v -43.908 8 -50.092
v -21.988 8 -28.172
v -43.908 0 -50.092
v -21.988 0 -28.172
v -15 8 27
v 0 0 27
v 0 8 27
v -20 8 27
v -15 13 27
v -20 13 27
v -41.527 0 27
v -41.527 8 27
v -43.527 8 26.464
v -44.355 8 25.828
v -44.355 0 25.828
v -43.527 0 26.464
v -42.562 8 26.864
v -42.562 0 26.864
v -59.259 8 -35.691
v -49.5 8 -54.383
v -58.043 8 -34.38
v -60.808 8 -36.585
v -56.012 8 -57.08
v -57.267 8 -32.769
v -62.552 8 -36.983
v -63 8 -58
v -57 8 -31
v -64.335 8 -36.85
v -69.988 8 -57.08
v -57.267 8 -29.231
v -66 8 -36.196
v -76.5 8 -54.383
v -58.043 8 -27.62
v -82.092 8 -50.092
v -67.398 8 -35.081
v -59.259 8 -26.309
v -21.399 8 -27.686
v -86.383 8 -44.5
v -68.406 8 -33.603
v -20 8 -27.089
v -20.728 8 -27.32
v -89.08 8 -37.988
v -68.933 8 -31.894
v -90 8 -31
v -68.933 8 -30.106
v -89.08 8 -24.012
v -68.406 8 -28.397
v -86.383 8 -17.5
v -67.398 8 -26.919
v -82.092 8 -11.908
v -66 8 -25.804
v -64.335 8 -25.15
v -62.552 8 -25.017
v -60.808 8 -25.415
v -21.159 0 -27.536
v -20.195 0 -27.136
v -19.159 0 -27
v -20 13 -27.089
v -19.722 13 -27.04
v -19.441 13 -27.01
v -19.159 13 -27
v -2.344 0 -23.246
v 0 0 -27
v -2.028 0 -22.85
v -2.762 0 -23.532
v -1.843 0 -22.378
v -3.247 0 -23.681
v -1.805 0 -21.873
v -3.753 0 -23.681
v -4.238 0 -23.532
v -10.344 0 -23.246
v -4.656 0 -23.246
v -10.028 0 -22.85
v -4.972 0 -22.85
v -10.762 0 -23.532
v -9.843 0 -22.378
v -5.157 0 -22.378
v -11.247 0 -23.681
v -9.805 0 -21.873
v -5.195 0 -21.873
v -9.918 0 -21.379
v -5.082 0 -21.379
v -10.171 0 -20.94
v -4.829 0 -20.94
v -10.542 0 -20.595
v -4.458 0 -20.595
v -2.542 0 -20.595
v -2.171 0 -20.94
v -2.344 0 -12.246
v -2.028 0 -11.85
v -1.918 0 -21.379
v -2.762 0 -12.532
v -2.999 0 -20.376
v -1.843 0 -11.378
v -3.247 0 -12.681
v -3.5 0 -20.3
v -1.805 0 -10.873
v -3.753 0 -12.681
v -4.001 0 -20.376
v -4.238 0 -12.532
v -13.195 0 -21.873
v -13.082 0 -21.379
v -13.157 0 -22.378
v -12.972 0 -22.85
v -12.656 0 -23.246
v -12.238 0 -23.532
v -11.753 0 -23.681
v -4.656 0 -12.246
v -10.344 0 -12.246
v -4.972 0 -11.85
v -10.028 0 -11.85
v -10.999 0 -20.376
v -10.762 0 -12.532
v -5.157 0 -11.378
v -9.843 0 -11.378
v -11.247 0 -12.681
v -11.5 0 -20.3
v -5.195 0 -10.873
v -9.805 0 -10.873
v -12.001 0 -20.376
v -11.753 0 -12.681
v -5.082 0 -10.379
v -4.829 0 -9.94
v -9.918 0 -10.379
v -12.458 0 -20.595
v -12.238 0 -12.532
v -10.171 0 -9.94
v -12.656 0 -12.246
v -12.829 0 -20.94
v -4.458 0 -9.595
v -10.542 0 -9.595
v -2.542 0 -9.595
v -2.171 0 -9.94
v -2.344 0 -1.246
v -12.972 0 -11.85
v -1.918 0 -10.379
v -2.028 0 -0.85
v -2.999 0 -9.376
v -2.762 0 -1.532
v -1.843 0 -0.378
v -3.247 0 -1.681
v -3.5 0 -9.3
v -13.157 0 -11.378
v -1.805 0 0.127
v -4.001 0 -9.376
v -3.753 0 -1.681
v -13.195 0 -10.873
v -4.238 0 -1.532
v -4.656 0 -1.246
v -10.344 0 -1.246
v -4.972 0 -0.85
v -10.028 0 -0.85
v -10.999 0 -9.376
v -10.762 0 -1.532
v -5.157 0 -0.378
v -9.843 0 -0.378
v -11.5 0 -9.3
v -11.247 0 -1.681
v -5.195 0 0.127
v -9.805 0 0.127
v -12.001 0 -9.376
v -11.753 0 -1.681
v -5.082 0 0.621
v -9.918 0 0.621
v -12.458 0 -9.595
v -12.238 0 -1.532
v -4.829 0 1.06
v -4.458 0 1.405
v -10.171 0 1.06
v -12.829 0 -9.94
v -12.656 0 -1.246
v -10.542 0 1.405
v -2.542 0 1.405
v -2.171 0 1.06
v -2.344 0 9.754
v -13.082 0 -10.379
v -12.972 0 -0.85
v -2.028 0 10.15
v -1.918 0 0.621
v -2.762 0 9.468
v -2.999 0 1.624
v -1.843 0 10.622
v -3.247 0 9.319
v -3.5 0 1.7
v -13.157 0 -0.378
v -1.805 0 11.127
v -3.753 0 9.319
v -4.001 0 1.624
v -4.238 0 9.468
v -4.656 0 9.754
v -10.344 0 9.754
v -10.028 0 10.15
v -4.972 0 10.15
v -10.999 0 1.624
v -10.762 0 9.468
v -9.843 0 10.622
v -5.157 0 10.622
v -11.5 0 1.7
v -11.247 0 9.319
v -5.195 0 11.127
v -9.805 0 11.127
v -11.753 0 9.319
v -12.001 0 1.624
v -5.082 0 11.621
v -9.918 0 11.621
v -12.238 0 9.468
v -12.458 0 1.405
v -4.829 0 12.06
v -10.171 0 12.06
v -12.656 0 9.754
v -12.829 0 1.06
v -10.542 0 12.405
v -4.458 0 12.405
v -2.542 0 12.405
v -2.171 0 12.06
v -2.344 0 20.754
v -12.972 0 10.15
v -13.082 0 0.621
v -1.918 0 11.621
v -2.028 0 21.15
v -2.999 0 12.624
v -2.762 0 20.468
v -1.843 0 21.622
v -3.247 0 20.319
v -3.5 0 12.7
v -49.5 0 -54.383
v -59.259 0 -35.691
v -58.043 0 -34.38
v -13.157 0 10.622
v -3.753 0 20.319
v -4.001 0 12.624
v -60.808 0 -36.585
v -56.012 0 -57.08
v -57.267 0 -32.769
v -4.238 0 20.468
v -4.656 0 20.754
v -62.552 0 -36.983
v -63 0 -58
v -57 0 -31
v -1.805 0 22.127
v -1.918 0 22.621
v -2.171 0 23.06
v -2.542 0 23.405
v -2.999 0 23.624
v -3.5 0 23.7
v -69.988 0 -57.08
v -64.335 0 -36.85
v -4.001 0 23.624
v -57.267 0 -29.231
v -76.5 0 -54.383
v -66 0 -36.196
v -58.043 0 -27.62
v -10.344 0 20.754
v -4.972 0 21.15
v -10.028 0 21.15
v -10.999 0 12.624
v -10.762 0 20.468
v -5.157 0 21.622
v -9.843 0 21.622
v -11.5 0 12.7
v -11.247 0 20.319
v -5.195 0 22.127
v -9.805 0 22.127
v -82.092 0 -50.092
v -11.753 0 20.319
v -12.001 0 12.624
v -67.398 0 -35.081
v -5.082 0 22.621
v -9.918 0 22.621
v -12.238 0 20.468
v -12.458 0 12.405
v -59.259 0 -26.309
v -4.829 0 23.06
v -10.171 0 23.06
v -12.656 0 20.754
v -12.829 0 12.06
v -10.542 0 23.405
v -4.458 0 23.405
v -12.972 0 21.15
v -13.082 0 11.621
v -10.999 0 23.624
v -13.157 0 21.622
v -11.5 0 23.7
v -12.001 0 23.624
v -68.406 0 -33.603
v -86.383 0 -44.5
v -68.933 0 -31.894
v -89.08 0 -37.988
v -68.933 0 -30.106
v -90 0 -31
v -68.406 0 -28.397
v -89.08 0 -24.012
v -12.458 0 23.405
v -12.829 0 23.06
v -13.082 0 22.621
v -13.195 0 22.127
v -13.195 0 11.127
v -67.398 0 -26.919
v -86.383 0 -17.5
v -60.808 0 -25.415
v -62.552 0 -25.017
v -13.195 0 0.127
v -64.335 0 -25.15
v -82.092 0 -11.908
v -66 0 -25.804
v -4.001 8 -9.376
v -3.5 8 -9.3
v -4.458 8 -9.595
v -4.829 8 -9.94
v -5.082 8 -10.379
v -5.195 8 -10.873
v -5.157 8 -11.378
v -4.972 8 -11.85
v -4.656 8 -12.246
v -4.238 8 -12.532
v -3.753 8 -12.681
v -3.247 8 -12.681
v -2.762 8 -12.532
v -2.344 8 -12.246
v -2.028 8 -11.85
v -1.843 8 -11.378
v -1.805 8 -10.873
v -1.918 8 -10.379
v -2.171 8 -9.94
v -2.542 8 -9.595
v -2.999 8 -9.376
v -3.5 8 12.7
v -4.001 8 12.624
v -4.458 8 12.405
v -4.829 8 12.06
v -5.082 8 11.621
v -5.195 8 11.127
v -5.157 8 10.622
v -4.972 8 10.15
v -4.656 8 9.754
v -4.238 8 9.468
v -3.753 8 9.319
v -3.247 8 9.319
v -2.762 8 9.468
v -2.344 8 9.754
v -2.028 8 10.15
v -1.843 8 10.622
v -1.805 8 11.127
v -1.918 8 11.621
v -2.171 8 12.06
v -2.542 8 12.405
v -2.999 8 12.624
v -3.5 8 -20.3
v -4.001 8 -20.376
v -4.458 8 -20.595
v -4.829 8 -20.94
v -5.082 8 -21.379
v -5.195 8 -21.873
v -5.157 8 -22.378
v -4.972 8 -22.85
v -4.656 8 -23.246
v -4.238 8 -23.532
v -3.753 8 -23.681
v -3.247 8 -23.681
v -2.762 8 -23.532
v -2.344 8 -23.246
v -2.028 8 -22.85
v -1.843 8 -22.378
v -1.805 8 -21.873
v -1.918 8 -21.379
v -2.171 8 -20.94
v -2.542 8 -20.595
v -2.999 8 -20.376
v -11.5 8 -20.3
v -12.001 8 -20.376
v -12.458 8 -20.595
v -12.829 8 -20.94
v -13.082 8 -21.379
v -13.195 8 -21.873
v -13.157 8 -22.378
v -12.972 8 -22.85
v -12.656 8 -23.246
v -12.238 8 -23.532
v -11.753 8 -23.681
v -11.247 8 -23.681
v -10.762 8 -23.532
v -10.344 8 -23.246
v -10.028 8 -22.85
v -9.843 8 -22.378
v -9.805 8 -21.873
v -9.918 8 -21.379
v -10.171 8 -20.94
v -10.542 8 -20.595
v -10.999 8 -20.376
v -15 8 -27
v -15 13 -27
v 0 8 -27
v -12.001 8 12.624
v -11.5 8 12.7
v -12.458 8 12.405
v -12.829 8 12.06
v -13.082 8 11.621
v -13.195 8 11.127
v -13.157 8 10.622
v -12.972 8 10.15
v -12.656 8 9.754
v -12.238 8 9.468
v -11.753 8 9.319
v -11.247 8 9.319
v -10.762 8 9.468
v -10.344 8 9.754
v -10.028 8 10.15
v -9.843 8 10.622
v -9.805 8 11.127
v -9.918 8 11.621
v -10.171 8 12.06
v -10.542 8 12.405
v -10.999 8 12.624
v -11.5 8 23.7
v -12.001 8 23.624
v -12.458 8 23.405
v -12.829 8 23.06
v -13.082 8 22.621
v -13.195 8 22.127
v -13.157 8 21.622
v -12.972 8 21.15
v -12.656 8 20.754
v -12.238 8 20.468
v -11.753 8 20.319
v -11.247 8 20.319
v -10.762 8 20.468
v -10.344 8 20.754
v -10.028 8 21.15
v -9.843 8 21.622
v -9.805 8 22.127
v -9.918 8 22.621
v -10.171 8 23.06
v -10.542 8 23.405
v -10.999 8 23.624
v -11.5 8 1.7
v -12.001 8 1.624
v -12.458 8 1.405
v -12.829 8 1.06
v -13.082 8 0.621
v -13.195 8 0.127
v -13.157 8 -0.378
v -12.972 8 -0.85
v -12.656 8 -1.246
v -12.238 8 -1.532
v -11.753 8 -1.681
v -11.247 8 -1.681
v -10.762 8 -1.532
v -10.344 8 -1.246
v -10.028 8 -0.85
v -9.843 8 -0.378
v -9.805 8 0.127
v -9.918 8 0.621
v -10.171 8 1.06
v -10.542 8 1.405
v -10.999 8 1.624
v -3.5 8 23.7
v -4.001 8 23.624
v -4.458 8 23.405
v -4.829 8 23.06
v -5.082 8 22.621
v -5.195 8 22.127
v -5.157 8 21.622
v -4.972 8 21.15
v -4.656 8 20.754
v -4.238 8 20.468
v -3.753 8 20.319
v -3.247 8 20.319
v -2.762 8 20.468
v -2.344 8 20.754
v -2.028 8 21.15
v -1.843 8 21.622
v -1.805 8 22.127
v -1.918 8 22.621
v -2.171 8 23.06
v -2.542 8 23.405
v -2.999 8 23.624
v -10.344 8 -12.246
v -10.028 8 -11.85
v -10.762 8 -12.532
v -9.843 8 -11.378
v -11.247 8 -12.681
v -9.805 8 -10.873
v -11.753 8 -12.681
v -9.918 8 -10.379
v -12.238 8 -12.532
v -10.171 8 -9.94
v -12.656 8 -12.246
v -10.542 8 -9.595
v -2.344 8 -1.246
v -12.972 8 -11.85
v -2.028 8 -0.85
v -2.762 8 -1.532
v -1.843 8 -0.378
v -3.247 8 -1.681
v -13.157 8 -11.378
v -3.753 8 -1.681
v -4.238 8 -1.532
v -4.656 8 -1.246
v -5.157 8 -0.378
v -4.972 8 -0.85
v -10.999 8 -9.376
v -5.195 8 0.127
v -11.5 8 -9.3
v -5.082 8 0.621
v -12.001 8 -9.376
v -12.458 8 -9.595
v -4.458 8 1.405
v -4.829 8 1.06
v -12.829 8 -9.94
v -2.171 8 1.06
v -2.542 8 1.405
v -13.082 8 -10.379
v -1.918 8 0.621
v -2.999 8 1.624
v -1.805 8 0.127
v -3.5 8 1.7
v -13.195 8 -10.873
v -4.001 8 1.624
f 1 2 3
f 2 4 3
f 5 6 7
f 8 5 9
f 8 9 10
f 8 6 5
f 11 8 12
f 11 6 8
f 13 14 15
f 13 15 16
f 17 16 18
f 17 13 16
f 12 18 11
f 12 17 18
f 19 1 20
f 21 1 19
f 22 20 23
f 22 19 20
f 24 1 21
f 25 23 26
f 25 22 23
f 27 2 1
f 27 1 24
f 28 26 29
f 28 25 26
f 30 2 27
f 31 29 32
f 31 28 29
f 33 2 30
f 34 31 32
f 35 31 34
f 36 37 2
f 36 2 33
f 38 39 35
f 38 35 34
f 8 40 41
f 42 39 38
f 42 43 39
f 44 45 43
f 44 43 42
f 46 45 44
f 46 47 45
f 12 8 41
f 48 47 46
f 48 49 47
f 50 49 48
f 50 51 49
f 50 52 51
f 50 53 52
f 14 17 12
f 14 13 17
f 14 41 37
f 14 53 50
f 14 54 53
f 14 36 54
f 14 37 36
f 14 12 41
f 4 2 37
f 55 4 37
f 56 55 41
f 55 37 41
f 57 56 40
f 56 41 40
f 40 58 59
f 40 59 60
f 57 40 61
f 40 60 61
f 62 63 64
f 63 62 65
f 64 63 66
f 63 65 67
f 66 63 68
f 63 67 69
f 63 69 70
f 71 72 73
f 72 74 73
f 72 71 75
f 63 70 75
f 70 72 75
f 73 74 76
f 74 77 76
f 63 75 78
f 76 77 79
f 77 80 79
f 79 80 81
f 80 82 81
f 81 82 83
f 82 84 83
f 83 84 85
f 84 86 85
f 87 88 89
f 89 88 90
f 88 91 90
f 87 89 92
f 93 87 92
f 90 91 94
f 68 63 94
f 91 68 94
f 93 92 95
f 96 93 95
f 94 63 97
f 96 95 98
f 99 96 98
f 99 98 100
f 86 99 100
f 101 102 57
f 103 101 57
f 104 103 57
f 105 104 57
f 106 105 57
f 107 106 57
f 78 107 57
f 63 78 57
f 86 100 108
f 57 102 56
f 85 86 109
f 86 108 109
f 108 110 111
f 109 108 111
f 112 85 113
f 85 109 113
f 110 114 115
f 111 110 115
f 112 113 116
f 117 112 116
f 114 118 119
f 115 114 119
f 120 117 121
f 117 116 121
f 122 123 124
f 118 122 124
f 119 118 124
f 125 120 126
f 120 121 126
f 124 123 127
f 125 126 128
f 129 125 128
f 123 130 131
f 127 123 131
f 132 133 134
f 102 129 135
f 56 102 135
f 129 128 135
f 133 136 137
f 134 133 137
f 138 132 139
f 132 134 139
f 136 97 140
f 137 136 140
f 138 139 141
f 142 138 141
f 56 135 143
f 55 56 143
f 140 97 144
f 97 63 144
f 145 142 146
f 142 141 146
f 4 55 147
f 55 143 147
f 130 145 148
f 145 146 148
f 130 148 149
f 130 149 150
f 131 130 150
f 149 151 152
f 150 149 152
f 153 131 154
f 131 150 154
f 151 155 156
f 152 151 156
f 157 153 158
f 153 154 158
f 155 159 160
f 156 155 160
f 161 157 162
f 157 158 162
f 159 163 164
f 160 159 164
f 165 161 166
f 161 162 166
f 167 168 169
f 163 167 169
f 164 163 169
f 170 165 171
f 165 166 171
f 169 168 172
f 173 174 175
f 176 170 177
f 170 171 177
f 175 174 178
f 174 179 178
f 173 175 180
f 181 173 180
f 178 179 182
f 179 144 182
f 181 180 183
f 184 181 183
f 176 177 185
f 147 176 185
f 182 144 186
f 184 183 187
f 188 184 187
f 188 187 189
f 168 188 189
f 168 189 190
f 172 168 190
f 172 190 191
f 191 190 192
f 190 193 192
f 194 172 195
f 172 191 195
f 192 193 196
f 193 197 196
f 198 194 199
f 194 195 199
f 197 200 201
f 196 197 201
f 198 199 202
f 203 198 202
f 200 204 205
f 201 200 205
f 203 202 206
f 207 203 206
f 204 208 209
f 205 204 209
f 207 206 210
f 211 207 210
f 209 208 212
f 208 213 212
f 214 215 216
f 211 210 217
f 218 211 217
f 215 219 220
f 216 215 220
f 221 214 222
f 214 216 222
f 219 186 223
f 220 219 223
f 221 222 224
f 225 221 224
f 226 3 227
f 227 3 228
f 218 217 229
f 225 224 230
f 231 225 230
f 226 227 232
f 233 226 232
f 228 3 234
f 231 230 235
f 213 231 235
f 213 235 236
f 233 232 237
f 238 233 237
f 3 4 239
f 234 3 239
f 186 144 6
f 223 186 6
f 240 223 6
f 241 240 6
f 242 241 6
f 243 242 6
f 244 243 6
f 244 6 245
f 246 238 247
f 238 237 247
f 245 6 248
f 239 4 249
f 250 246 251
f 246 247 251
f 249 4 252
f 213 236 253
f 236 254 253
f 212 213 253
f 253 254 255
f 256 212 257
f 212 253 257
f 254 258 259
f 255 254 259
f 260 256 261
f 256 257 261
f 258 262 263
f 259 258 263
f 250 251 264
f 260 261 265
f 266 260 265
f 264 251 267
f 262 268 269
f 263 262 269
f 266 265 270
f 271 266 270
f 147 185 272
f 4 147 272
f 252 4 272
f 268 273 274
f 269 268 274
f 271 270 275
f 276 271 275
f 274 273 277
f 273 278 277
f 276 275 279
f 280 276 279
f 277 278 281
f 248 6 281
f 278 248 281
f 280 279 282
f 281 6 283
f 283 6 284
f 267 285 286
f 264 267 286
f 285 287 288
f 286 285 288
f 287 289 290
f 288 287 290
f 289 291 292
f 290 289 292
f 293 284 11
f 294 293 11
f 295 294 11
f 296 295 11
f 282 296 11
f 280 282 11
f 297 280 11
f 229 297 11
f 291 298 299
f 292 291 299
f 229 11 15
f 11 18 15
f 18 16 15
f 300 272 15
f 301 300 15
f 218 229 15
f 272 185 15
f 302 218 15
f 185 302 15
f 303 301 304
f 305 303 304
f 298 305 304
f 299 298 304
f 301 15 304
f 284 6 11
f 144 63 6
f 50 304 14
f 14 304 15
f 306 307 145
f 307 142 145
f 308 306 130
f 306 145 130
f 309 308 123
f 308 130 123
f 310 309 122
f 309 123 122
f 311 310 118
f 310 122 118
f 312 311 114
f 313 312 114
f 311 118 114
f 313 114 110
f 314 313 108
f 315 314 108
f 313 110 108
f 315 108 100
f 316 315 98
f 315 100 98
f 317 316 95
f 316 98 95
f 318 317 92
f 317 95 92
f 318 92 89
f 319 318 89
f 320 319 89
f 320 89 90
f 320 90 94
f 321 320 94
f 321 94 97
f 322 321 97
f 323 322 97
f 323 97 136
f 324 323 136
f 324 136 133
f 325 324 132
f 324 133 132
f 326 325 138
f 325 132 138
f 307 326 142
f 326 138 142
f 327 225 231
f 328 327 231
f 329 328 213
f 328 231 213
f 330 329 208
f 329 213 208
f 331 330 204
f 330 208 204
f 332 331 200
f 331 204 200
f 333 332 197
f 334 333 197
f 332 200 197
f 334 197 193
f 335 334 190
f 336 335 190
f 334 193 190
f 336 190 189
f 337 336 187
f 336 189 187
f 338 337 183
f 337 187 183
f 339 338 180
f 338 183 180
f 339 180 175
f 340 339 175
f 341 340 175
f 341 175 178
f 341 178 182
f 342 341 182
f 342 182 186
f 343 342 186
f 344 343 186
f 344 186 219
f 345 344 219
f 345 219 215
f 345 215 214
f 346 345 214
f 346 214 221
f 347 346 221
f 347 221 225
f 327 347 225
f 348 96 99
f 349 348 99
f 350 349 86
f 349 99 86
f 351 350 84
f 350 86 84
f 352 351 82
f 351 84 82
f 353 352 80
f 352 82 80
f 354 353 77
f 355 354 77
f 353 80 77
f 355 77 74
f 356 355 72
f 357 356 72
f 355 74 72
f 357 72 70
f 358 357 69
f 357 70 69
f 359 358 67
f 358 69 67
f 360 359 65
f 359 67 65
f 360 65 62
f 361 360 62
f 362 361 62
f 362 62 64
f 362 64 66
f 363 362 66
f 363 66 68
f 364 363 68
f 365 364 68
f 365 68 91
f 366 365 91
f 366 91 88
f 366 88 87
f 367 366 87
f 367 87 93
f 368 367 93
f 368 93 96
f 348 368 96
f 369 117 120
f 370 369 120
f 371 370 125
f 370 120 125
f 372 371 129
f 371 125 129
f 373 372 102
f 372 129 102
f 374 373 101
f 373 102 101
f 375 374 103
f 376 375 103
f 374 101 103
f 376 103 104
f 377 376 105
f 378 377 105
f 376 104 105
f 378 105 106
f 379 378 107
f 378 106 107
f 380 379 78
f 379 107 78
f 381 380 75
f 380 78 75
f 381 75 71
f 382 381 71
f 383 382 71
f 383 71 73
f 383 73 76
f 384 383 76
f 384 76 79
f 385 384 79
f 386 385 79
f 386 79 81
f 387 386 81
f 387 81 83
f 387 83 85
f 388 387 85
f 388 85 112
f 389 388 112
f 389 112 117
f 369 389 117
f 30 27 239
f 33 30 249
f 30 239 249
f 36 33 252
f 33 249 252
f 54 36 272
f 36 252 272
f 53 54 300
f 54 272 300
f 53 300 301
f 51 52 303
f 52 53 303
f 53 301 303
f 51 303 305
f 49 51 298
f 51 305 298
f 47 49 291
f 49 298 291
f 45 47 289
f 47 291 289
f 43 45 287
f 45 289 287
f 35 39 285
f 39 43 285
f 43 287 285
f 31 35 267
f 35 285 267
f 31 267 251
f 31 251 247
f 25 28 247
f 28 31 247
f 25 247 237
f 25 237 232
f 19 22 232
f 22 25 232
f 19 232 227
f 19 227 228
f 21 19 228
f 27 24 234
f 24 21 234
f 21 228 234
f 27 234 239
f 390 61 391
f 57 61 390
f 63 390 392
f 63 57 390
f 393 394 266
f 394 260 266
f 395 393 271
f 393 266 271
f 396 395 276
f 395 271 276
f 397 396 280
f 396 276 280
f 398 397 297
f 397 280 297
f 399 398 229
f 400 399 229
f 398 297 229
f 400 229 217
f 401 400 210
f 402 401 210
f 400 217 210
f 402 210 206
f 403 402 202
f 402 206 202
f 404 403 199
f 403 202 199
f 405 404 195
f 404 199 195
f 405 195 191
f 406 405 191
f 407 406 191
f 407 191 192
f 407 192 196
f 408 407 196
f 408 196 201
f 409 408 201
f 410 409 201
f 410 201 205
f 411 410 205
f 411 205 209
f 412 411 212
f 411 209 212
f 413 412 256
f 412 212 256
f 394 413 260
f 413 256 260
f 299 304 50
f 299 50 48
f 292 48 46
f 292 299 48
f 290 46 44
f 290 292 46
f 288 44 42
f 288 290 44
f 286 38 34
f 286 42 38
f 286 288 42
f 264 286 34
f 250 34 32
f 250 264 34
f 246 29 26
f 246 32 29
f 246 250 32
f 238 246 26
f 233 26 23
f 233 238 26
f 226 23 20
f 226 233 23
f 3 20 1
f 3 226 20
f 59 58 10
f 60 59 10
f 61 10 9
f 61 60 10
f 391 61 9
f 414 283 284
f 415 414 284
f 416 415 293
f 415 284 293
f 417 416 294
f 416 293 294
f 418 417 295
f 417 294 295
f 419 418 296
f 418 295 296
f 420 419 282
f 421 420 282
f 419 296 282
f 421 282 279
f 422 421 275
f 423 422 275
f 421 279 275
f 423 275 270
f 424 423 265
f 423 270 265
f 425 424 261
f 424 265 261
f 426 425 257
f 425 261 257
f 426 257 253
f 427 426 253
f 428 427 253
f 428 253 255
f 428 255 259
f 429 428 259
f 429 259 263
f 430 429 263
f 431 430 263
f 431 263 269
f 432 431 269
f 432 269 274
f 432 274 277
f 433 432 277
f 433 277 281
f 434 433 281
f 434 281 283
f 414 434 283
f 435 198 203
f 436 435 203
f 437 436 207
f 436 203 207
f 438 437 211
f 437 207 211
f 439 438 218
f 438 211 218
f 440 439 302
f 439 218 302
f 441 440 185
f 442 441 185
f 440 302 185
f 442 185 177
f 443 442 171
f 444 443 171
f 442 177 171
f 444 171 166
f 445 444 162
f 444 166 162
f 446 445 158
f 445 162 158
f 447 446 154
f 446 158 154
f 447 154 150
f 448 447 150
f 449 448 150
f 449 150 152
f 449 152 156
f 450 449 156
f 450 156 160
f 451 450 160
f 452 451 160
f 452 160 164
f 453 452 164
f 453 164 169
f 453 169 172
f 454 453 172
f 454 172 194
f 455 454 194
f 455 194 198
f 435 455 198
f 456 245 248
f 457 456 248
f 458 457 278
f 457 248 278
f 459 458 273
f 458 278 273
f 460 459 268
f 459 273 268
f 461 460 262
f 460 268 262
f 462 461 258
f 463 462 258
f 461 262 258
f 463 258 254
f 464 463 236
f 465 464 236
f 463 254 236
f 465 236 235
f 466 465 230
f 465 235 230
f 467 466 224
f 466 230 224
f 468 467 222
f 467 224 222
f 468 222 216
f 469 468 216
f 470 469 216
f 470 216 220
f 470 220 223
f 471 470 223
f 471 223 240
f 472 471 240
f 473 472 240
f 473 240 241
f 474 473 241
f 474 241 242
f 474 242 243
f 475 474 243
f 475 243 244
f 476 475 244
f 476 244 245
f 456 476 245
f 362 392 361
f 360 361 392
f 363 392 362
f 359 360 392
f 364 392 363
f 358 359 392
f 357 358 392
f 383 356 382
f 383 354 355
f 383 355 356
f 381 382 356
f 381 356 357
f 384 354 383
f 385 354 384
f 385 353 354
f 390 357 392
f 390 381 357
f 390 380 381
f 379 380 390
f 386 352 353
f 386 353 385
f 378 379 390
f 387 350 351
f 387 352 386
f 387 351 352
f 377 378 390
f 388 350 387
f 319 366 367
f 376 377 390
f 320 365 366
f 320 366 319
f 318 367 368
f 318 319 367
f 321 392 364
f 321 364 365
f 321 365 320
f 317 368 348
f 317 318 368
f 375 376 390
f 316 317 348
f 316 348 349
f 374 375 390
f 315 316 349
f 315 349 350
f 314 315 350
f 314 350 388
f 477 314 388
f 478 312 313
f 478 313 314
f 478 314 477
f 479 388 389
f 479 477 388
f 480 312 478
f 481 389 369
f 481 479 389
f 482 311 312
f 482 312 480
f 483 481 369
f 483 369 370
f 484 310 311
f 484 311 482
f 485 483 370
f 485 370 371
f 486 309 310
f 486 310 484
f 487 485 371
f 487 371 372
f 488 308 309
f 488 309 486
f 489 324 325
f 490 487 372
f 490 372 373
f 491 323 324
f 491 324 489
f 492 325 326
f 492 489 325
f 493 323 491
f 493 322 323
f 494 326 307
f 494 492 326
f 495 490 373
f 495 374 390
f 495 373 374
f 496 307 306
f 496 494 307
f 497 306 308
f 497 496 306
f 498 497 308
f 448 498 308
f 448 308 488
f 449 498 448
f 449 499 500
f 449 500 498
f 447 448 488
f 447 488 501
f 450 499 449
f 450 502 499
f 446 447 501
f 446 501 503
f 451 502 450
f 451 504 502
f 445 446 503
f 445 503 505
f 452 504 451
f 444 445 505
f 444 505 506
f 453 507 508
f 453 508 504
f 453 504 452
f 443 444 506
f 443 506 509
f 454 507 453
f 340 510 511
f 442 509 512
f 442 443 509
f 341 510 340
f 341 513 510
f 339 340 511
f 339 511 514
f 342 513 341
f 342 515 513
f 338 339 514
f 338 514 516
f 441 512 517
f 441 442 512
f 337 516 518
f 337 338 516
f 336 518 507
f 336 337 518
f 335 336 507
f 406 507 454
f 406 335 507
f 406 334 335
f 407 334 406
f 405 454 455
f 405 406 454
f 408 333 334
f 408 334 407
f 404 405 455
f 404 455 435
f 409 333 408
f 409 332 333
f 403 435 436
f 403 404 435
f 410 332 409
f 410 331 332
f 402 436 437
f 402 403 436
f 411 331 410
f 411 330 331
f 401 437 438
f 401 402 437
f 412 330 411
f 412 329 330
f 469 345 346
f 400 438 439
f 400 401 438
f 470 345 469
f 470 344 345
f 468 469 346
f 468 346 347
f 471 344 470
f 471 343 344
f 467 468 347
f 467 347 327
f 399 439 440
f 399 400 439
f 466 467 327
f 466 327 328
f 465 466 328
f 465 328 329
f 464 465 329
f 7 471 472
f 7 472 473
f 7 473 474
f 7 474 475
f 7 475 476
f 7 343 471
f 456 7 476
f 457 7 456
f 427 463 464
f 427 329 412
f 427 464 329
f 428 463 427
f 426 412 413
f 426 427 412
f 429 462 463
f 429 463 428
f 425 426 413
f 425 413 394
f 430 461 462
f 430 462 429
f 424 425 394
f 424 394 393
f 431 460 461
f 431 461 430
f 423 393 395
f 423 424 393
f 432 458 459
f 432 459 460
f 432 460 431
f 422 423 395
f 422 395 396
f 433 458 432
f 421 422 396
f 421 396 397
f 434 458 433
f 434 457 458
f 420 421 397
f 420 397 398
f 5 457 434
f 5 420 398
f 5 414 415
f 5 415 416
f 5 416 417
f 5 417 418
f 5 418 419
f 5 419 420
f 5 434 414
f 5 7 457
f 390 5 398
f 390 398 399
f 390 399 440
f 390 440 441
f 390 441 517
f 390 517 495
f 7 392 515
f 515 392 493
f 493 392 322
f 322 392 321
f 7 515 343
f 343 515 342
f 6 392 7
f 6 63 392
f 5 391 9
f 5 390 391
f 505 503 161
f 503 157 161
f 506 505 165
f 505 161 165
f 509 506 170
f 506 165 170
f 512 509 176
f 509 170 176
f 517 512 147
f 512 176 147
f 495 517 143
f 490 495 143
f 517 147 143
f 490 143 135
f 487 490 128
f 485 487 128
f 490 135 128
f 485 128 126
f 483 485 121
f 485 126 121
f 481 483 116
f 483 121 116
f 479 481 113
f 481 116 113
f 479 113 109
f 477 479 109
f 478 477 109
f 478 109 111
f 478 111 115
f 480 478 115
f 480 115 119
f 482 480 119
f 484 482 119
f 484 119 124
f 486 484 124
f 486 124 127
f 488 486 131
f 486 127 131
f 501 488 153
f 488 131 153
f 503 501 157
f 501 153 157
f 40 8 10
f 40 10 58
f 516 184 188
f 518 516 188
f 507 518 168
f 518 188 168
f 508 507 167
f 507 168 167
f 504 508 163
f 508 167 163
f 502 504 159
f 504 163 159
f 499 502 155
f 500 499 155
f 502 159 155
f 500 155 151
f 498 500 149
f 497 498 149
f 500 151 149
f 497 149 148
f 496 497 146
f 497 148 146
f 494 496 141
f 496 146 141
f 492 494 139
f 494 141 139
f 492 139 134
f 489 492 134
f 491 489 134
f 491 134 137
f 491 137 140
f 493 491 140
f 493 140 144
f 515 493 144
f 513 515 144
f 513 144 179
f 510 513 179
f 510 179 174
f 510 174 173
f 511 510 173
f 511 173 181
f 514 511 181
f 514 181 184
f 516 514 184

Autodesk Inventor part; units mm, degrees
ref_plane "YZ Plane" through (0, 0, 0) normal (1, 0, 0) x (0, 1, 0)
ref_plane "XZ Plane" through (0, 0, 0) normal (0, 1, 0) x (-1, 0, 0)
ref_plane "XY Plane" through (0, 0, 0) normal (0, 0, 1) x (1, 0, 0)
sketch "Skizze1" plane through (0, 0, 0) normal (0, 1, 0) x (-1, 0, 0)
  line L0 (20.8162, -27) -> (0, -27)
  line L1 (0, -27) -> (0, 27)
  line L2 (20.8162, -27) -> (43.9081, -50.0919)
  arc A0 (43.9081, -50.0919) -> (82.0919, -11.9081) centre (63, -31) ccw
  line L3 (82.0919, -11.9081) -> (43.1838, 27)
  line L4 (0, 27) -> (43.1838, 27)
  point P0 (0, 0)
  dimension "d0" = 54
  dimension "d40" = 135
  dimension "d42" = 54
  dimension "d43" = 31
  dimension "d47" = 63
extrude "Extrusion1" add sketch "Skizze1" along normal blind 8
sketch "Skizze3" plane through (0, 8, 0) normal (0, 1, 0) x (1, 0, 0)
  line L0 (0, 0) -> (-17.1865, 0) construction
  line L1 (0, -27) -> (0, 27) construction
  line L2 (0, -27) -> (0, 27) construction
  line L3 (0, 27) -> (-20.8162, 27) construction
  line L4 (-18, -27) -> (0, -27) construction
  line L5 (0, 27) -> (-20.8162, 27) construction
  line L6 (-20.8162, 27) -> (-43.9081, 50.0919) projected
  arc A0 (-43.9081, 50.0919) -> (-82.0919, 11.9081) centre (-63, 31) ccw projected
  line L7 (-82.0919, 11.9081) -> (-43.1838, -27) projected
  line L8 (-43.1838, -27) -> (0, -27) projected
  arc A1 (-43.9081, 50.0919) -> (-82.0919, 11.9081) centre (-63, 31) ccw projected
  circle A2 centre (-63, 31) radius 6
  point P0 (-18, 27)
  dimension "d48" = 12
extrude "Extrusion3" [suppressed]
sketch "Skizze5" plane through (0, 8, 0) normal (0, 1, 0) x (1, 0, 0)
  line L0 (0, -27) -> (0, 27) projected
  line L1 (0, 27) -> (-20.8162, 27) projected
  line L2 (-15, -27) -> (-20, -27)
  line L3 (-20, -27) -> (-20, 27)
  line L4 (-20, 27) -> (-15, 27)
  line L5 (-15, 27) -> (-15, -27)
  line L6 (-82.0919, 11.9081) -> (-43.1838, -27) projected
  line L7 (-43.1838, -27) -> (0, -27) projected
  line L8 (-20.8162, 27) -> (-43.9081, 50.0919) projected
  arc A0 (-43.9081, 50.0919) -> (-82.0919, 11.9081) centre (-63, 31) ccw projected
  point P0 (0, 0)
  dimension "d14" = 15
  dimension "d15" = 5
extrude "Extrusion4" add sketch "Skizze5" along normal blind 5 contours L2 L3 L1 L5
sketch "Skizze6" plane through (0, 8, 0) normal (0, 1, 0) x (1, 0, 0)
  line L0 (-15, 27) -> (-15, -27) projected
  line L1 (0, -27) -> (0, 27) projected
  line L2 (0, 27) -> (-15, 27) projected
  line L3 (0, 0) -> (67.4565, 0) construction
  line L4 (-15, -27) -> (0, -27) projected
  point P0 (-3.5, 0)
  dimension "d18" = 3.5
hole "Bohrung1" at (-3.5, 8, 0) direction (0, -1, 0) diameter 3.4 end through all clearance for "Inbusschraube ISO 4762" size "M3" standard "ISO"
pattern_linear "Rechteckige Anordnung1" count 5 spacing 11 along (0, 0, -1) count 2 spacing 8 along (-1, 0, 0) of "Bohrung1" first direction both ways yes
sketch "Skizze7" plane through (0, 0, 0) normal (0, -1, 0) x (1, 0, 0)
  circle A0 centre (-63, -31) radius 6
  circle A1 centre (-63, -31) radius 10 construction
  line L0 (-63, -45.6355) -> (-63, -17.0341)
  line L1 (-76.3383, -31) -> (-50.0008, -31)
  circle A2 centre (-63, -31) radius 6 projected
  point P0 (0, 0)
  point P1 (-63, -41)
  point P2 (-73, -31)
  point P3 (-63, -21)
  point P4 (-53, -31)
  dimension "d32" = 20
hole "Bohrung2" [suppressed]
fillet "Rundung1" radius 4 2 edges at (-20.8162, 4, -27) (-43.1838, 4, 27)
sketch "Skizze8" plane through (0, 8, 0) normal (0, 1, 0) x (1, 0, 0)
  arc A0 (-43.9081, 50.0919) -> (-82.0919, 11.9081) centre (-63, 31) ccw projected
  circle A1 centre (-63, 31) radius 6
  circle A2 centre (-63, 31) radius 4
  point P0 (0, 0)
  dimension "d50" = 12
  dimension "d51" = 8
extrude "Extrusion5" add sketch "Skizze8" along normal blind 3 contours A1 | A2
extrude "Extrusion6" add sketch "Skizze8" along normal blind 10 contours A2
sketch "Skizze9" plane through (0, 0, 0) normal (0, -1, 0) x (1, 0, 0)
  circle A0 centre (-63, -31) radius 4 projected
  circle A1 centre (-63, -31) radius 6 projected
  point P0 (0, 0)
extrude "Extrusion7" cut sketch "Skizze9" against normal through all contours A0 | A1
equation "\"d42\" = d0"
properties part number "dynamixel_pro_frame_part2" material "Aluminium 6061"
